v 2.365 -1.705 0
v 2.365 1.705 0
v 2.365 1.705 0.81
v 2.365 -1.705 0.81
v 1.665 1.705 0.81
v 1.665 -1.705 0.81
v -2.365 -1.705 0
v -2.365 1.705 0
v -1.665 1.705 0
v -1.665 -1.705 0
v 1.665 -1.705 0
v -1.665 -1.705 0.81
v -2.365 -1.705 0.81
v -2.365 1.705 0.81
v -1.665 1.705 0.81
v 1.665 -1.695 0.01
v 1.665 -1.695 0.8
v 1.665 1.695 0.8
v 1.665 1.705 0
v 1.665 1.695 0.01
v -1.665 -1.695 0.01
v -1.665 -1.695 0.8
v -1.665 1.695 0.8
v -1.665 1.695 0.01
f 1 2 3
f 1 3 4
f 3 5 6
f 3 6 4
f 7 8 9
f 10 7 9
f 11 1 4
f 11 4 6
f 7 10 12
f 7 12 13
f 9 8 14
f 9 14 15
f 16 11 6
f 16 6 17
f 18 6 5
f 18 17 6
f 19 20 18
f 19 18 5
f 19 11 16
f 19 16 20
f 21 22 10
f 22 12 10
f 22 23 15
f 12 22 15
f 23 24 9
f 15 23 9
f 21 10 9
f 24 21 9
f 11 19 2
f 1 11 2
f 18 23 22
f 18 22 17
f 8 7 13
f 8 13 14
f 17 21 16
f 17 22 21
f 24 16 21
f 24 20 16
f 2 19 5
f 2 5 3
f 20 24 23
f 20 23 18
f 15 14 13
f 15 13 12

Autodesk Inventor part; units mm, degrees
ref_plane "YZ Plane" through (0, 0, 0) normal (1, 0, 0) x (0, 1, 0)
ref_plane "XZ Plane" through (0, 0, 0) normal (0, 1, 0) x (-1, 0, 0)
ref_plane "XY Plane" through (0, 0, 0) normal (0, 0, 1) x (1, 0, 0)
sketch "Эскиз1" plane through (0, 0, 0) normal (0, 0, 1) x (1, 0, 0)
  line L0 (-2.365, 1.705) -> (2.365, 1.705)
  line L1 (2.365, 1.705) -> (2.365, -1.705)
  line L2 (2.365, -1.705) -> (-2.365, -1.705)
  line L3 (-2.365, -1.705) -> (-2.365, 1.705)
  point P0 (0, 0)
  dimension "d0" = 3.41
  dimension "d1" = 4.73
  dimension "d2" = 2.365
  dimension "d3" = 1.705
extrude "Выдавливание1" add sketch "Эскиз1" along normal blind 0.81
sketch "Эскиз2" plane through (0, 0, 0.81) normal (0, 0, 1) x (1, 0, 0)
  line L0 (2.365, 1.705) -> (2.365, -1.705) projected
  line L1 (-2.365, 1.705) -> (2.365, 1.705) projected
  line L2 (-2.365, -1.705) -> (-2.365, 1.705) projected
  line L3 (2.365, -1.705) -> (-2.365, -1.705) projected
  line L4 (-1.665, 1.705) -> (1.665, 1.705)
  line L5 (1.665, 1.705) -> (1.665, -1.705)
  line L6 (1.665, -1.705) -> (-1.665, -1.705)
  line L7 (-1.665, -1.705) -> (-1.665, 1.705)
  point P0 (0, 0)
  dimension "d6" = 0.7
  dimension "d7" = 0.7
extrude "Выдавливание2" cut sketch "Эскиз2" against normal blind 0.01 contours L5 L3 L7 L1
sketch "Эскиз3" plane through (-2.365, -1.705, 0) normal (0, -1, 0) x (1, 0, 0)
  line L0 (4.73, 0) -> (0, 0) projected
  line L1 (4.03, 0.8) -> (0.7, 0.8) projected
  line L2 (0.7, 0.8) -> (0.7, 0)
  line L3 (4.03, 0.8) -> (4.03, 0)
  point P0 (2.365, 0)
extrude "Выдавливание3" cut sketch "Эскиз3" against normal blind 0.01
sketch "Эскиз4" plane through (0, 0, 0) normal (0, 0, -1) x (-1, 0, 0)
  line L0 (-1.665, -1.695) -> (1.665, -1.695) projected
  line L1 (2.365, 1.705) -> (-2.365, 1.705) projected
  line L2 (1.665, -1.695) -> (1.665, 1.705)
  line L3 (-1.665, -1.695) -> (-1.665, 1.705)
  point P0 (0, 0)
extrude "Выдавливание4" cut sketch "Эскиз4" against normal blind 0.01
sketch "Эскиз5" plane through (-2.365, 1.705, 0.81) normal (0, 1, 0) x (1, 0, 0)
  line L0 (0.7, 0.01) -> (4.03, 0.01) projected
  line L1 (4.03, 0.8) -> (0.7, 0.8) projected
  line L2 (4.03, 0.01) -> (4.03, 0.8)
  line L3 (0.7, 0.01) -> (0.7, 0.8)
  point P0 (2.365, 0.81)
extrude "Выдавливание5" cut sketch "Эскиз5" against normal blind 0.01
equation "\"d2\" = 0.5 * d1"
equation "\"d3\" = 0.5 * d0"
equation "\"d7\" = d6"
properties part number "GP-WSM010"
